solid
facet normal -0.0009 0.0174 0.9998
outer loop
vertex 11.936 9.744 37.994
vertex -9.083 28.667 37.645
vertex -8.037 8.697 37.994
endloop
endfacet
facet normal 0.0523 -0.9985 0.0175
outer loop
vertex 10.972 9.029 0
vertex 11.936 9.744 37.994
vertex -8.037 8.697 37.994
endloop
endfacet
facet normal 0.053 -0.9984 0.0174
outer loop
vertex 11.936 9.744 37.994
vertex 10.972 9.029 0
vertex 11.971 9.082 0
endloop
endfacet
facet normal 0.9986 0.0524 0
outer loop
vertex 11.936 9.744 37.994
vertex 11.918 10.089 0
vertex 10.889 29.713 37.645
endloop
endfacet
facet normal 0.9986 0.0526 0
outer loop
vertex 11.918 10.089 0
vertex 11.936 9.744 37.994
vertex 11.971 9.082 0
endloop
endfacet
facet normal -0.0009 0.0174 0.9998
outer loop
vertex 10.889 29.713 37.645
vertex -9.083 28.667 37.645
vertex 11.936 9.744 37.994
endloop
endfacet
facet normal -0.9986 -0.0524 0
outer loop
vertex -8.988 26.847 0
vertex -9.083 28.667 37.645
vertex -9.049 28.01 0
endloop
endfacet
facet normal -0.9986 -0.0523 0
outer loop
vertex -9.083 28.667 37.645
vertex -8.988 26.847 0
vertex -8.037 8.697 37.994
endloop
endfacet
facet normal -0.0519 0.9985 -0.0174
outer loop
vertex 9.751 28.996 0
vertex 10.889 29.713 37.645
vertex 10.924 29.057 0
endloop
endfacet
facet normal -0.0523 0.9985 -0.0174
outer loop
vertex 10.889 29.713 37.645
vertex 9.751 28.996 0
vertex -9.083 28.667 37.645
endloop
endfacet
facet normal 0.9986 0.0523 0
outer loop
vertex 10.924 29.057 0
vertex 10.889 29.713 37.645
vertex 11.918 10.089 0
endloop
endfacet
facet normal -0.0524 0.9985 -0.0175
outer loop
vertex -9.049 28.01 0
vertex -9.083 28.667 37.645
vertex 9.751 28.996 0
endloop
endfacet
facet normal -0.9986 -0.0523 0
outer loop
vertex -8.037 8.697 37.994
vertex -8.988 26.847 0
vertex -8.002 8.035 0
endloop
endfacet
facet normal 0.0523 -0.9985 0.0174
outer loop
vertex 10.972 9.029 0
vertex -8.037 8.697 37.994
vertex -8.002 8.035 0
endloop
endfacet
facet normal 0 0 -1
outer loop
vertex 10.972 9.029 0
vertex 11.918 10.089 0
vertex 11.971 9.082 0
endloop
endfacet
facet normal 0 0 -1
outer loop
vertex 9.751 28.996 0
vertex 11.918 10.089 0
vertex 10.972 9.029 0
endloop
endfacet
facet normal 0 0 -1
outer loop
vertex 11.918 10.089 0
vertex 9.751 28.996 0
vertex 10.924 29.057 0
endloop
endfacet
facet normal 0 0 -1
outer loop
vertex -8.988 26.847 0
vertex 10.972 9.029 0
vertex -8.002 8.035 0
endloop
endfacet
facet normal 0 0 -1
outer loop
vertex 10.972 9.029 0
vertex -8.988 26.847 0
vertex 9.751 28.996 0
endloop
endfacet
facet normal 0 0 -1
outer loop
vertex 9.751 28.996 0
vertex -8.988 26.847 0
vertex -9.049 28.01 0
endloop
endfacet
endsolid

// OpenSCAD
//import("3DBenchy.stl");
difference(){
translate([-8,8,-2])rotate([-1,0,3])cube([20,20,40]);
translate([-20,0,-50])cube(50);
}
